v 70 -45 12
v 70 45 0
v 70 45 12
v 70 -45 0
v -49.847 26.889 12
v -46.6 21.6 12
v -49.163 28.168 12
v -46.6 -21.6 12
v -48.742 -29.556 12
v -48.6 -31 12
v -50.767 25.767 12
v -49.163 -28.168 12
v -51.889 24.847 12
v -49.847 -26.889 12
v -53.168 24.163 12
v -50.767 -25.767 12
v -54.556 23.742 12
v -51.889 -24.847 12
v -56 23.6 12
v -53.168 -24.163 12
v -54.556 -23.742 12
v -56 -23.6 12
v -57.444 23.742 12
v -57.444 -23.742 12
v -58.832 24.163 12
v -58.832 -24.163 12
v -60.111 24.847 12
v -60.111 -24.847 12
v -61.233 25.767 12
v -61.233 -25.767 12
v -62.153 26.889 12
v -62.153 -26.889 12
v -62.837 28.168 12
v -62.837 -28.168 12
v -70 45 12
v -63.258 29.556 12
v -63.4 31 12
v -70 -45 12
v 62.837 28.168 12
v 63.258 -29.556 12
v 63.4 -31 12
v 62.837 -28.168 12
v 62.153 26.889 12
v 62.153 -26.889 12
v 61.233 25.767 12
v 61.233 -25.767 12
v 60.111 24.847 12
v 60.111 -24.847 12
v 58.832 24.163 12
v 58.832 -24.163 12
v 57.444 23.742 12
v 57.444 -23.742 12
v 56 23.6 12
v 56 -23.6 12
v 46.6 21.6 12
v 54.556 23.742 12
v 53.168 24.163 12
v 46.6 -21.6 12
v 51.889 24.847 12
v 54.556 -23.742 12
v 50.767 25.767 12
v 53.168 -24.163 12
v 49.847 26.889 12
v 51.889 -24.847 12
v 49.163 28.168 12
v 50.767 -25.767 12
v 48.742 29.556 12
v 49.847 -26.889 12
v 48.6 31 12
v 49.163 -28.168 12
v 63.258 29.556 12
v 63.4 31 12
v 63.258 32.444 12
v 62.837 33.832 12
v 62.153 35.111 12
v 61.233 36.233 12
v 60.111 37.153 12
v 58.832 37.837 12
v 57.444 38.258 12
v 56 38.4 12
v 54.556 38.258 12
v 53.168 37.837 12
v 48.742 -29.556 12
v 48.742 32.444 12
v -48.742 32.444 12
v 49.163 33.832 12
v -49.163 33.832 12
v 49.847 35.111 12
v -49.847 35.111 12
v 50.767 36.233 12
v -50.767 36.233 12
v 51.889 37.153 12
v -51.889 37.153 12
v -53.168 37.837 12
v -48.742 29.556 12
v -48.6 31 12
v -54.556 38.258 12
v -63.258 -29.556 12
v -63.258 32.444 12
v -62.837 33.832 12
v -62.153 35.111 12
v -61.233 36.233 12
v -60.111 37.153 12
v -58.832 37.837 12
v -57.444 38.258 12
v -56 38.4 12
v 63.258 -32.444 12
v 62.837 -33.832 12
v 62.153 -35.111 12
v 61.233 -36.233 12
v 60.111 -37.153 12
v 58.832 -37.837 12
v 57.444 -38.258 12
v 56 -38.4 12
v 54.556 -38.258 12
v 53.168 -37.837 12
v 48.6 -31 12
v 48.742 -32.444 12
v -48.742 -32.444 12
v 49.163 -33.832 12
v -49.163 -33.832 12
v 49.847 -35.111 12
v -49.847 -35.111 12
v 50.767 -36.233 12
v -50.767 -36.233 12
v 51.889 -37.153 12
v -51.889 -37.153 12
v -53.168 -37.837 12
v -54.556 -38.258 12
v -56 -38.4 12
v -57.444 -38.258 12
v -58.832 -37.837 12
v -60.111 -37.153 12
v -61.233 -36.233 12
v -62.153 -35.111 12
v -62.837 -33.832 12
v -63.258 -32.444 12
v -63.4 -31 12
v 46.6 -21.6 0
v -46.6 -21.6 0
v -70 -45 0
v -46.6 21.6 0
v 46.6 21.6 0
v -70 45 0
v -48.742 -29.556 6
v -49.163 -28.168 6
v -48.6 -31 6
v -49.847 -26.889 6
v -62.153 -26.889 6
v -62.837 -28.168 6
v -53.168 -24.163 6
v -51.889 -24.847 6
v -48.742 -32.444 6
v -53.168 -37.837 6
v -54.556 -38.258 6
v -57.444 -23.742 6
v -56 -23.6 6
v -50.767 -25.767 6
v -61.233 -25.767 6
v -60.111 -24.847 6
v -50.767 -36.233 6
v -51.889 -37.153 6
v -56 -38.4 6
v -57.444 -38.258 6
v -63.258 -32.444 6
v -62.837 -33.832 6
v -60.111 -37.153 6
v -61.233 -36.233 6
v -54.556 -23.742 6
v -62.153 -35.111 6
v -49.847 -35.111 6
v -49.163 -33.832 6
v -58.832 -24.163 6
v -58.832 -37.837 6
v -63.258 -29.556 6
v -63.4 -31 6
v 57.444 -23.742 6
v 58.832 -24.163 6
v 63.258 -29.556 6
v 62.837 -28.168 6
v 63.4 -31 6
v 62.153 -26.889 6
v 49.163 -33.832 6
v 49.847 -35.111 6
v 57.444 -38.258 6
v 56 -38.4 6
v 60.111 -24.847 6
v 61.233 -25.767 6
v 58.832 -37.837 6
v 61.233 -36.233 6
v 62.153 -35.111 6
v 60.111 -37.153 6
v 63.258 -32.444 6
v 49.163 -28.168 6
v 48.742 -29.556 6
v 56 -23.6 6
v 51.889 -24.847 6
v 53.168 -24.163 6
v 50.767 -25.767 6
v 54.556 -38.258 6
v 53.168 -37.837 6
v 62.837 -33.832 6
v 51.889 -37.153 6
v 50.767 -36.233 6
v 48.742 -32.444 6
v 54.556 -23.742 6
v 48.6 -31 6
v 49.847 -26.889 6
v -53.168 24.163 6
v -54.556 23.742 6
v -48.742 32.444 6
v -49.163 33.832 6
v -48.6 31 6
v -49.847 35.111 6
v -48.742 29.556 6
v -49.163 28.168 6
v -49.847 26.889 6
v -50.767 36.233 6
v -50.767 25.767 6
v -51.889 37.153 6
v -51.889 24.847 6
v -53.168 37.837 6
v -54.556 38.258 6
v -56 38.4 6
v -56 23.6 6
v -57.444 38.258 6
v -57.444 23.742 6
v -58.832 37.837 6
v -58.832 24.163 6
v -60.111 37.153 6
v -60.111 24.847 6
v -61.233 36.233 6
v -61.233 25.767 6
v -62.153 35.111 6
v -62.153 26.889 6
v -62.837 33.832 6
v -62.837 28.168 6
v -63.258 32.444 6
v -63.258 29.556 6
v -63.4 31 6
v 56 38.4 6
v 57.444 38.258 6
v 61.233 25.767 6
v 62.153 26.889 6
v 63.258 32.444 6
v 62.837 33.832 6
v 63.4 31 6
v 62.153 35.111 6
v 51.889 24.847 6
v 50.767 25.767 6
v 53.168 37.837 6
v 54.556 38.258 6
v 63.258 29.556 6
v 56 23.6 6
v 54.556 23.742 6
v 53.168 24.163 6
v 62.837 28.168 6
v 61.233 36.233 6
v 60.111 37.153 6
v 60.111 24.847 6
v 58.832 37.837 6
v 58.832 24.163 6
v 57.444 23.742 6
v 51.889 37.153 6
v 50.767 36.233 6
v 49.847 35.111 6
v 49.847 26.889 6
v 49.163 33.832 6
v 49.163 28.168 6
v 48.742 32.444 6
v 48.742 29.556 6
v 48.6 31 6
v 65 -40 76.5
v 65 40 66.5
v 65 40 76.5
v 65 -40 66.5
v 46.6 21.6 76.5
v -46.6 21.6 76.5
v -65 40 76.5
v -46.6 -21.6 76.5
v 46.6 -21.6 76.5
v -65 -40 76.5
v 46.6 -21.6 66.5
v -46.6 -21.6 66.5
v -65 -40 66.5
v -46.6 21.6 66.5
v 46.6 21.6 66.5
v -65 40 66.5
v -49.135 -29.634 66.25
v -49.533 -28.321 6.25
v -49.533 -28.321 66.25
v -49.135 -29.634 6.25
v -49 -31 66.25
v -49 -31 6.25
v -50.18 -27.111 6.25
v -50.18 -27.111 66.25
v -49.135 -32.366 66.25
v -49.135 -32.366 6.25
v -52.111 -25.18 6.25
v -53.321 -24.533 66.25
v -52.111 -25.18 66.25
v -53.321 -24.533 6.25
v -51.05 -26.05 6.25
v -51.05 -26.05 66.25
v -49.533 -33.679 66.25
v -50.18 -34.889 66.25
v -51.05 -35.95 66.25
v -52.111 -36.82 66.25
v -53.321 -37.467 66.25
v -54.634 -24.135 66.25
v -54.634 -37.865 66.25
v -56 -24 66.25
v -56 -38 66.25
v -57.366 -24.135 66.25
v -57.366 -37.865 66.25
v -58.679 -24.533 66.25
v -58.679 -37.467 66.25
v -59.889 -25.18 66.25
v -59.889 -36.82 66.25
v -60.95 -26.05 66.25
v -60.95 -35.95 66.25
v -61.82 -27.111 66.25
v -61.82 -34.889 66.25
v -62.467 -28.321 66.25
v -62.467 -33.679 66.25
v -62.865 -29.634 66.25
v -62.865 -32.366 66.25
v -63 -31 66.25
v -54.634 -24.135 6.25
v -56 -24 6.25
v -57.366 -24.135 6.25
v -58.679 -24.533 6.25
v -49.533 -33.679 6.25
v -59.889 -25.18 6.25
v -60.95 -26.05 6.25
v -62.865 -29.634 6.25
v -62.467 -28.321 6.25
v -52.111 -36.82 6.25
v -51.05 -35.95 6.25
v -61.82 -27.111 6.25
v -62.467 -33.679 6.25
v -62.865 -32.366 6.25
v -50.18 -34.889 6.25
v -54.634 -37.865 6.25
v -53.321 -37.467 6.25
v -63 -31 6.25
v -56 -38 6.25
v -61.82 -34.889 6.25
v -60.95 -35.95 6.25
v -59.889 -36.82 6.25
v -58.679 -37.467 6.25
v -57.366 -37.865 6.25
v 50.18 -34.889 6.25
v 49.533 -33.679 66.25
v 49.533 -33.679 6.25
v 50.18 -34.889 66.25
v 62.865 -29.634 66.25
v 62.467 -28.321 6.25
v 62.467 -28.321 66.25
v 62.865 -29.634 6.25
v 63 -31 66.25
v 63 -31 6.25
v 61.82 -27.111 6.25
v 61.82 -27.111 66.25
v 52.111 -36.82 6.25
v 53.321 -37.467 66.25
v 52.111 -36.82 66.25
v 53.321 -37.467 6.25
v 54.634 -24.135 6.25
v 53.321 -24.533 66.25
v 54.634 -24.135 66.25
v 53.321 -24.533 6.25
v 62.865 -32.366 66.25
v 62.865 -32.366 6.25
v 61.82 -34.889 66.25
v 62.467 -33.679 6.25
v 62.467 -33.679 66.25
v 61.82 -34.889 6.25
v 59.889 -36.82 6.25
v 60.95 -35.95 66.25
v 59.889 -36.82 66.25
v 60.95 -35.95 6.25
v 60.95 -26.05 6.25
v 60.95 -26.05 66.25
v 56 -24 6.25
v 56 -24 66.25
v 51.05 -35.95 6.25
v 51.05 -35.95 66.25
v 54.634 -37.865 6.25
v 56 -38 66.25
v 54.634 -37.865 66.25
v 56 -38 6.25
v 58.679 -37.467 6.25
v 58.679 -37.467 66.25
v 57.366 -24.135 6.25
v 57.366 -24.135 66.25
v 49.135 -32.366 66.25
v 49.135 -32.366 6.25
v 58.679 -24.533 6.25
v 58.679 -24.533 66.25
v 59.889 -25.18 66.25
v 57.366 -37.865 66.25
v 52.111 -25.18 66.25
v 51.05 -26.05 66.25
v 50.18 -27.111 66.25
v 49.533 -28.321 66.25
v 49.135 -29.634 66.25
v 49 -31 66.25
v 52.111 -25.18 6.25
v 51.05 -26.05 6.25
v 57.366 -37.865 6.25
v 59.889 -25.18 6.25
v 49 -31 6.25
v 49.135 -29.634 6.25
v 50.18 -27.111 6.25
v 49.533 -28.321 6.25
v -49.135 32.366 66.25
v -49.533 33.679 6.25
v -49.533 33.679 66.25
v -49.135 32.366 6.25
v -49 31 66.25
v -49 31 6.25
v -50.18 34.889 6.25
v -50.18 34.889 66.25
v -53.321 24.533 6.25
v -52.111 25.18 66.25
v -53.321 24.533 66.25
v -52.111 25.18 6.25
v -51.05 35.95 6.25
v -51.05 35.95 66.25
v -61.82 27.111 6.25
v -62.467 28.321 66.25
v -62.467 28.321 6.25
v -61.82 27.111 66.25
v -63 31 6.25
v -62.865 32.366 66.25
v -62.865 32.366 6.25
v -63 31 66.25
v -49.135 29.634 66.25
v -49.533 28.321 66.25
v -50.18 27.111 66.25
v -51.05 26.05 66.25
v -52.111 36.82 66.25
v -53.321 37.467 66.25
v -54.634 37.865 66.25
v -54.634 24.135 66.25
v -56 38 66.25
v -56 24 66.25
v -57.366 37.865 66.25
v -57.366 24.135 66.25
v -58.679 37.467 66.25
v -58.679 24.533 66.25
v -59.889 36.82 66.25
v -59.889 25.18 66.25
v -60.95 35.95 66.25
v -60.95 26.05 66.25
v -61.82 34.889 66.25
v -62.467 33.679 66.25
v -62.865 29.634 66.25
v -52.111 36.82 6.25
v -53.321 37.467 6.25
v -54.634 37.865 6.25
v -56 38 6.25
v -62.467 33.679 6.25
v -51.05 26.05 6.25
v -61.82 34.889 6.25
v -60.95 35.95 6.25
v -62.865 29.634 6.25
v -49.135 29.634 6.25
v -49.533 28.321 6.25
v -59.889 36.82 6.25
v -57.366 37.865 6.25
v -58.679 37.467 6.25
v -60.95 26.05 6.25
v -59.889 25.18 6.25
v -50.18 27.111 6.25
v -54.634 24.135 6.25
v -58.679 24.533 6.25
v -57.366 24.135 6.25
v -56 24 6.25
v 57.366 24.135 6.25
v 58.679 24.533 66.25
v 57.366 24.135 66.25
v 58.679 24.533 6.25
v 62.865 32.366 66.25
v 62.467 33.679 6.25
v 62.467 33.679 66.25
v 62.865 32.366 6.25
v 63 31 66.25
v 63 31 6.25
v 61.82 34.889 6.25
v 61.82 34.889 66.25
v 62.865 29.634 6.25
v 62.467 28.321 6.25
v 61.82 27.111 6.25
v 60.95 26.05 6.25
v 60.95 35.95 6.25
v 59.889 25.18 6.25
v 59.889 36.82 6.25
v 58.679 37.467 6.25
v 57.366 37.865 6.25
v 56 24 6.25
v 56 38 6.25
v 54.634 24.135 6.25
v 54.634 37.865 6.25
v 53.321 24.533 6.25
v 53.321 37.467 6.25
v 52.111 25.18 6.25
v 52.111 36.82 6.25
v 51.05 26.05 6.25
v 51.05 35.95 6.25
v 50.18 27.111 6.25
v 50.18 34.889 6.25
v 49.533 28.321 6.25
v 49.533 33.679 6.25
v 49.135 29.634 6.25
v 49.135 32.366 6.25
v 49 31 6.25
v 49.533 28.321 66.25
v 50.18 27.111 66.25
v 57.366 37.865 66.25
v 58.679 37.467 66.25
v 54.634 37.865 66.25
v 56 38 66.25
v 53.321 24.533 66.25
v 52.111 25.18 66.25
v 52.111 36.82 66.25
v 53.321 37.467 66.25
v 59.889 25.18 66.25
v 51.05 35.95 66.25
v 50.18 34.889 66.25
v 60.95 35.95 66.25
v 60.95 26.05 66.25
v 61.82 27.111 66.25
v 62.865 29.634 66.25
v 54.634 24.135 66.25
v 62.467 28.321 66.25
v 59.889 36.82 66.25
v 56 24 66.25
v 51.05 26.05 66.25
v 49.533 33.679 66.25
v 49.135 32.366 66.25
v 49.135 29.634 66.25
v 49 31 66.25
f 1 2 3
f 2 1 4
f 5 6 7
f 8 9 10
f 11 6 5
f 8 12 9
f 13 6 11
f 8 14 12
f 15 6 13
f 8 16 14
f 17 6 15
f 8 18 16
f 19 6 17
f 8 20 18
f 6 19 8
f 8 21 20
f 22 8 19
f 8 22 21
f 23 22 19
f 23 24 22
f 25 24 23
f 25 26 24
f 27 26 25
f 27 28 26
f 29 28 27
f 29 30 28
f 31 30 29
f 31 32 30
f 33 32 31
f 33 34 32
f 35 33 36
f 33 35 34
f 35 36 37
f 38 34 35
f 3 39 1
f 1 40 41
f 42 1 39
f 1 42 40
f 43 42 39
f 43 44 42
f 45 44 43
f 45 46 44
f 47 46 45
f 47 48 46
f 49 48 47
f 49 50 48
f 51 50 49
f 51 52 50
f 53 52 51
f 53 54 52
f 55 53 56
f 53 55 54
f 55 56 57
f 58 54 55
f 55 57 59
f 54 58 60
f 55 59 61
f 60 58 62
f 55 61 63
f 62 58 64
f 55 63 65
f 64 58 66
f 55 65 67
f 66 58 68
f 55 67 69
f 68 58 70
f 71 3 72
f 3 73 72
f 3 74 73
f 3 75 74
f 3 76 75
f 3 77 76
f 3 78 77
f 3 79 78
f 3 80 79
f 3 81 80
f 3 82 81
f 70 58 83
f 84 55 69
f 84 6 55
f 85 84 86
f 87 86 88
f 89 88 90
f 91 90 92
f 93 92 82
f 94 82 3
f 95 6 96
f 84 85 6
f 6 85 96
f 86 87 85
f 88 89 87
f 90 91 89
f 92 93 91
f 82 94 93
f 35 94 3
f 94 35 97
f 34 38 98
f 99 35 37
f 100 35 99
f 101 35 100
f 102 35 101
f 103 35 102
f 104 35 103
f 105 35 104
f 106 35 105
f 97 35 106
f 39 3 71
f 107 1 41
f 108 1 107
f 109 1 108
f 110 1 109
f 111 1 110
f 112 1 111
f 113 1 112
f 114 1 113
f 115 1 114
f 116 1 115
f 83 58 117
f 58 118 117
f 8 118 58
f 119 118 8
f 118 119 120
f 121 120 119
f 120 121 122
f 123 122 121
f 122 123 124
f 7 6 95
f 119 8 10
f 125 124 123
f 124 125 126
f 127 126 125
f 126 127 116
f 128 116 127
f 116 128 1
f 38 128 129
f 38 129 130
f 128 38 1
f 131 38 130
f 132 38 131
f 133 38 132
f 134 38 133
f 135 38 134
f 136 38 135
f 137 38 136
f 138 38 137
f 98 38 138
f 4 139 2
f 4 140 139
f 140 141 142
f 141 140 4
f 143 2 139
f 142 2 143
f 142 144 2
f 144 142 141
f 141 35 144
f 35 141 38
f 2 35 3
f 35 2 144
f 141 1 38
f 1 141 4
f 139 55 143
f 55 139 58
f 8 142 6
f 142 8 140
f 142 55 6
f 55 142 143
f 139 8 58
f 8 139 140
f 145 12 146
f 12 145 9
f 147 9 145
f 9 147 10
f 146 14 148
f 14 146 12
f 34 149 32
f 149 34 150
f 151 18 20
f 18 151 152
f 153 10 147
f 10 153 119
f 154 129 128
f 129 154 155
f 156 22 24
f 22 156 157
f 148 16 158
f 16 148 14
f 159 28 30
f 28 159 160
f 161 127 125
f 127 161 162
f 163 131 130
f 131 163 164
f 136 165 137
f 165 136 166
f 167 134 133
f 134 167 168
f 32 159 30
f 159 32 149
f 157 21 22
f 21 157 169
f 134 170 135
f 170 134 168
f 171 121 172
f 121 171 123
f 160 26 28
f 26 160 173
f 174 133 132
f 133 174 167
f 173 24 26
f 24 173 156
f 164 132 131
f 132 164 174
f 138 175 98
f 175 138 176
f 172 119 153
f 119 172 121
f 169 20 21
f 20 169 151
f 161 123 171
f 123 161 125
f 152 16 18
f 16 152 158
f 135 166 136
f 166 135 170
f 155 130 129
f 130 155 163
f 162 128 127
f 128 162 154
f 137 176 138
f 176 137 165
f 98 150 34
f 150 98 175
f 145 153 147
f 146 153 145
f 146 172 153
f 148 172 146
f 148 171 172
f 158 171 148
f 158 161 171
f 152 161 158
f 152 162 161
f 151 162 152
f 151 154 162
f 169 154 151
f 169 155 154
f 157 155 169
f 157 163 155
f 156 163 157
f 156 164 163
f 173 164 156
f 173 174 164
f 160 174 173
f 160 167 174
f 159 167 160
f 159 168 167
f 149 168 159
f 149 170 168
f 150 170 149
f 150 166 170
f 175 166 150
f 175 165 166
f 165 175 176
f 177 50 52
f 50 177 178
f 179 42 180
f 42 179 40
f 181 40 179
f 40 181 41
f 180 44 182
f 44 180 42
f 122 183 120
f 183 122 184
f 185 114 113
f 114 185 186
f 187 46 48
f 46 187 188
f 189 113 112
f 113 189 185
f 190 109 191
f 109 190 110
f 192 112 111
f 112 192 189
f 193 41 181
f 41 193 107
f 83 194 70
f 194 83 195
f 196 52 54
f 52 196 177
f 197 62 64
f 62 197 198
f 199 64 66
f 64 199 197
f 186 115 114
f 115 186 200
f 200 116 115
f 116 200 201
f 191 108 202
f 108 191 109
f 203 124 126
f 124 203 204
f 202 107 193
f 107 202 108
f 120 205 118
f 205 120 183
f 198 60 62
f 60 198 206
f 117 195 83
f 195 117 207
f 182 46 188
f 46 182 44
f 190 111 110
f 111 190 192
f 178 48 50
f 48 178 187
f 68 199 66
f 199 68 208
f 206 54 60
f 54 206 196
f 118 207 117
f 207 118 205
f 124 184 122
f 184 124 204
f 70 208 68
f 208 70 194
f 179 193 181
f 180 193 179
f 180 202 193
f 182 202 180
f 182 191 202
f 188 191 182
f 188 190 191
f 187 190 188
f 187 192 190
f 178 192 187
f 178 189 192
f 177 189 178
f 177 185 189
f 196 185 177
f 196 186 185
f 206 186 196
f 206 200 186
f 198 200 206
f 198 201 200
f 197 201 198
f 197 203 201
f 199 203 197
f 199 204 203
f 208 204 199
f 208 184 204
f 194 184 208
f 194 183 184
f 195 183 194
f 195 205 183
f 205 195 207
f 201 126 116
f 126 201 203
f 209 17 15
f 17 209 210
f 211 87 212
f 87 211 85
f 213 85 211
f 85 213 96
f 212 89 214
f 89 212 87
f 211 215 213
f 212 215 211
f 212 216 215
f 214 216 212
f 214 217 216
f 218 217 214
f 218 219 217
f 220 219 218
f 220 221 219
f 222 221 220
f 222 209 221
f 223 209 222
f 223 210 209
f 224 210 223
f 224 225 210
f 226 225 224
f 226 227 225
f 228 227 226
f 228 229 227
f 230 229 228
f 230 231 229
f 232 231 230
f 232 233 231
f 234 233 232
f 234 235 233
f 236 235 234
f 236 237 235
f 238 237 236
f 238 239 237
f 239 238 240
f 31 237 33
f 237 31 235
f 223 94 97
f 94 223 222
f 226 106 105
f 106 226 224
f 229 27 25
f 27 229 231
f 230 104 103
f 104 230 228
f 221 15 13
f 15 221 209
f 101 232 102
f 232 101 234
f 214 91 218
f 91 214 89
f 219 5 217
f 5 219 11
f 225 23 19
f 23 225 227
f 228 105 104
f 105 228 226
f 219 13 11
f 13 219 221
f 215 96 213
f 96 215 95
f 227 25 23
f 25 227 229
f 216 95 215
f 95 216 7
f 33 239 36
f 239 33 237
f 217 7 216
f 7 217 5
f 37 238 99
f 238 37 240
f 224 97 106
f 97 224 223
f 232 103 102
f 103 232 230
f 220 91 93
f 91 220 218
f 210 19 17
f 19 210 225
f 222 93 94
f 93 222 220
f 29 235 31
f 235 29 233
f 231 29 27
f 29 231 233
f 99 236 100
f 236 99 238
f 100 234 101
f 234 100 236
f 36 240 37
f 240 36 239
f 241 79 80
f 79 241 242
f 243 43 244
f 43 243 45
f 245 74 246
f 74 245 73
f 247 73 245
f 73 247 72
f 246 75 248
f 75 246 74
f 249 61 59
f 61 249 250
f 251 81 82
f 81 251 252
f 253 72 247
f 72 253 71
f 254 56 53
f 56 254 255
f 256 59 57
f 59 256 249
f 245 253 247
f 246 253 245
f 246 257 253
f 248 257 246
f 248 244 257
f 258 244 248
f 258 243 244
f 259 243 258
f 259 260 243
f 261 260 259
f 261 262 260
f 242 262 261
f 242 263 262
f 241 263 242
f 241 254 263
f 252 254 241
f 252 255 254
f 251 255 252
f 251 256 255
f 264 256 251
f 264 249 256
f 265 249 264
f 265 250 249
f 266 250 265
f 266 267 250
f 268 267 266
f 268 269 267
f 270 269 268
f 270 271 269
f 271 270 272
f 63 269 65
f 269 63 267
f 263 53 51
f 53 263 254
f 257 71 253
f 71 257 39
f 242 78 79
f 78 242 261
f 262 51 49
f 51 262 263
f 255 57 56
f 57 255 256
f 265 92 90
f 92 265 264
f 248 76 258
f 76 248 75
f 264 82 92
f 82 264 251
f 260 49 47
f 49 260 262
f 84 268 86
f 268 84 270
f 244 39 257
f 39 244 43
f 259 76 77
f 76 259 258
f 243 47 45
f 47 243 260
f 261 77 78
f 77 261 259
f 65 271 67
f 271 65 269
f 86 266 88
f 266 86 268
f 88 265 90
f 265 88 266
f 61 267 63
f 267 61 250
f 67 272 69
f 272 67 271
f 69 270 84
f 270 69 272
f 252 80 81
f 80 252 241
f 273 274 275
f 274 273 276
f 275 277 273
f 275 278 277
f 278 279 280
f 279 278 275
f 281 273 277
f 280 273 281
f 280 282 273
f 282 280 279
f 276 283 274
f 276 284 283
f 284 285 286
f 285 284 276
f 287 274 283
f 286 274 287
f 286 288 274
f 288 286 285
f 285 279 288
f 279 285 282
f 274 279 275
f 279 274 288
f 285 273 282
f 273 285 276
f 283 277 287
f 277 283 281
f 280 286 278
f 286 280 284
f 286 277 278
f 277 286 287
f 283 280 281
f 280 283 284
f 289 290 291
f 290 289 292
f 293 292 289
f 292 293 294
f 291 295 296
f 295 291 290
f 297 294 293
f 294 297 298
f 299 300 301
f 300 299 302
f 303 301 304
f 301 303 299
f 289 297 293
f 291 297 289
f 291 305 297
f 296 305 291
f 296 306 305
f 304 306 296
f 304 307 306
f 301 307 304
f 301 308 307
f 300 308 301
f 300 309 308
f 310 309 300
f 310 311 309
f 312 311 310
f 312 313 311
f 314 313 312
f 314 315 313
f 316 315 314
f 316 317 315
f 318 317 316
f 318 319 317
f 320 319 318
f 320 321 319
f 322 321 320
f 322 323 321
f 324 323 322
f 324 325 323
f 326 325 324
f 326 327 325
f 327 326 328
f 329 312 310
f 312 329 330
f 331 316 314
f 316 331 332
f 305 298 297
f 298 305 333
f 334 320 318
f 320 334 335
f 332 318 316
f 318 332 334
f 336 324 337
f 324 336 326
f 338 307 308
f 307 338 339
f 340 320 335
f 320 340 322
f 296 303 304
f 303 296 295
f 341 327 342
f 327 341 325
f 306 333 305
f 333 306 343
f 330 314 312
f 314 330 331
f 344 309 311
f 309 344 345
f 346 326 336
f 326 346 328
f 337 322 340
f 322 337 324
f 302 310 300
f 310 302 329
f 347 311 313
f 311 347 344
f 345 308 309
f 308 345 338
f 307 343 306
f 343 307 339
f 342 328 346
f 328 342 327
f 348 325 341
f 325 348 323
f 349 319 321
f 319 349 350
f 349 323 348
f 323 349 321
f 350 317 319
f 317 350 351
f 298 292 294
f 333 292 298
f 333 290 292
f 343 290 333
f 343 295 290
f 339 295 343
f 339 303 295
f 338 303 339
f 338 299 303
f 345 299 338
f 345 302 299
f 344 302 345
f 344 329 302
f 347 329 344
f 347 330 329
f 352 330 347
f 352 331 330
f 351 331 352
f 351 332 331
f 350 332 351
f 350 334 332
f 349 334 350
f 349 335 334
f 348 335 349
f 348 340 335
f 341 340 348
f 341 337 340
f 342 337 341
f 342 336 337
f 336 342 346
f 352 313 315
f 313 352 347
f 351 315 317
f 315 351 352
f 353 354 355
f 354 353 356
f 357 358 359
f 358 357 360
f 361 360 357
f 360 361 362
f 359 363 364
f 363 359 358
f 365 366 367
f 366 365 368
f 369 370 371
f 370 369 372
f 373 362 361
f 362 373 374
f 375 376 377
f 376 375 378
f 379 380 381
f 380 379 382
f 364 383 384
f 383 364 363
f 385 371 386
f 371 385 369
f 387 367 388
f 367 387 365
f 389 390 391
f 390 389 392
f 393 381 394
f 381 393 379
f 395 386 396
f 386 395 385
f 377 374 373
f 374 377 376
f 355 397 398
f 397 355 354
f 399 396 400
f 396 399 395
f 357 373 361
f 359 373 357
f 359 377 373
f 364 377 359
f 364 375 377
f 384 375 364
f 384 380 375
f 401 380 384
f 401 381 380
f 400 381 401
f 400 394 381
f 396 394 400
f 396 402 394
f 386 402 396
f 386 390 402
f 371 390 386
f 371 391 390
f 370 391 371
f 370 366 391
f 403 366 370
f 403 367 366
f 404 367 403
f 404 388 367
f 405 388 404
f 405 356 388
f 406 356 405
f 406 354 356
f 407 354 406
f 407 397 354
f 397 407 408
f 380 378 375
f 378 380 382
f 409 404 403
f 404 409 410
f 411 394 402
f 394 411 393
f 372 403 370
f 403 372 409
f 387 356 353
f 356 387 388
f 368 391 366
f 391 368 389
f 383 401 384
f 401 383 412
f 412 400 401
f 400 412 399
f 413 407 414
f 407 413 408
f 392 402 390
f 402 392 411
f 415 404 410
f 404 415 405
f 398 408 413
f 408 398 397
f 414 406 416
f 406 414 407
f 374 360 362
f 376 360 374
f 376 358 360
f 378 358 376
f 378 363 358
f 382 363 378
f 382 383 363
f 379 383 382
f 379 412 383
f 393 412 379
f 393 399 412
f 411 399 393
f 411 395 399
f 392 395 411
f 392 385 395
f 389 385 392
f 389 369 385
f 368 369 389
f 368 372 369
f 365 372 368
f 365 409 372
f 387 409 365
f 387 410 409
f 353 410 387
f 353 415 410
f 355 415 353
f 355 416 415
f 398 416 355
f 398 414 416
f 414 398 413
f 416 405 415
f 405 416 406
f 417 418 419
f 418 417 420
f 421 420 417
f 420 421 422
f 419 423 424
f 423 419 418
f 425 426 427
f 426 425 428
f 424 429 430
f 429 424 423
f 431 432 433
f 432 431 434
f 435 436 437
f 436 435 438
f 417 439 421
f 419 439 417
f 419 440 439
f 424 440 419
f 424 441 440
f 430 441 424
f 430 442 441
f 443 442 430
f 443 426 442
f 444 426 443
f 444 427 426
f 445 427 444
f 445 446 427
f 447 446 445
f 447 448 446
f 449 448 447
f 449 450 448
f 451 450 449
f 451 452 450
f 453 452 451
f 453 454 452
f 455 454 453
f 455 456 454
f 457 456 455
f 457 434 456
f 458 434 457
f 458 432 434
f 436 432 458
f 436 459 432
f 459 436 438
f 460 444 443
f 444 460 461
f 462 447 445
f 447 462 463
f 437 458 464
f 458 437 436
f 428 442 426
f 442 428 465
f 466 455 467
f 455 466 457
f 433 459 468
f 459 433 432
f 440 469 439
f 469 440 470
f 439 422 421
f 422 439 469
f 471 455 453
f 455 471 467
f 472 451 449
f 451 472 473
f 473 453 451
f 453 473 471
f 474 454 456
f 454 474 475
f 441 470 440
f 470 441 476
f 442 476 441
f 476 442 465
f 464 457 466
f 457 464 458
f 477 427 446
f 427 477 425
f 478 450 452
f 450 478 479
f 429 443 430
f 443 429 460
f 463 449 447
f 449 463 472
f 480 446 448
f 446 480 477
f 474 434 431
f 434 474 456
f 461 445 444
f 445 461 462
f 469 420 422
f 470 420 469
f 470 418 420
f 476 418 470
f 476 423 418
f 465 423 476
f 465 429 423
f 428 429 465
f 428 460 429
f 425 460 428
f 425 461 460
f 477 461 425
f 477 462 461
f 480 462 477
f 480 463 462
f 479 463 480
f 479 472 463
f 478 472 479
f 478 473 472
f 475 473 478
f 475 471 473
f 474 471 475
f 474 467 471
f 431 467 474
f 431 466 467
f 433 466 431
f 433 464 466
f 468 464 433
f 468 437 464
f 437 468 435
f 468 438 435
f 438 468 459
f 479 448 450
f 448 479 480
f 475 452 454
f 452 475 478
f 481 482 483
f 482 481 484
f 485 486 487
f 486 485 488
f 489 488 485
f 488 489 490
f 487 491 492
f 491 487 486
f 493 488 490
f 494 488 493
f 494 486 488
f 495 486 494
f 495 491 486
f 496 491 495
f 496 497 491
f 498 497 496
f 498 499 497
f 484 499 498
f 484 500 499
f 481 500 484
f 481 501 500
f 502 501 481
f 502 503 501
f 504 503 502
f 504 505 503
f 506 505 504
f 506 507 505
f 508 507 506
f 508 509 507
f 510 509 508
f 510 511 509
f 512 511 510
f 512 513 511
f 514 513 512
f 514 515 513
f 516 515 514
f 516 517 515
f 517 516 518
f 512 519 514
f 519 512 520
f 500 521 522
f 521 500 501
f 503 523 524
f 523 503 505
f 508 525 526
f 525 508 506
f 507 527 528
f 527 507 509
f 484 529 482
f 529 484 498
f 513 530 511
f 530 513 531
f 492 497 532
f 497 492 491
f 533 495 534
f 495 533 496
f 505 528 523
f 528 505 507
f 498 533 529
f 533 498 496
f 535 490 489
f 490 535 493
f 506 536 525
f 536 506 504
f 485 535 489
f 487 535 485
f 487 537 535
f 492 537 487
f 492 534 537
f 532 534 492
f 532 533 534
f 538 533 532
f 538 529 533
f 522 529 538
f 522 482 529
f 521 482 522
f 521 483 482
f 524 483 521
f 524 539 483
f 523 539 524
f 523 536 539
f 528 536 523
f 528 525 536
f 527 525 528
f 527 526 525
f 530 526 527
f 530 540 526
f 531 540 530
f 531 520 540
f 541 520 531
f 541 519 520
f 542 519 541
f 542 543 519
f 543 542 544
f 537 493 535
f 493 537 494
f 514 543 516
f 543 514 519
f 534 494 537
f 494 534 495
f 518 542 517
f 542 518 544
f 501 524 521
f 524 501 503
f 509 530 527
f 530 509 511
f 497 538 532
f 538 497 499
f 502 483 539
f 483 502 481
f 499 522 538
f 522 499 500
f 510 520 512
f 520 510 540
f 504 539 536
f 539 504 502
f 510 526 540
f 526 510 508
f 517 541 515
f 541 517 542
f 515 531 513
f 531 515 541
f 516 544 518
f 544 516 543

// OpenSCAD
$fn = 32;

// ------------------------------------------------------------------------
// Frame cube: base 140 x 90 mm, posts 60 mm tall
// Every part is its own module, assembly() places every instance.
// ------------------------------------------------------------------------

// --- part 1 ---
module base_frame() {
  difference() {
    translate([-70, -45, 0]) cube([140, 90, 12]);
    translate([-46.6, -21.6, -1]) cube([93.2, 43.2, 14]);
    translate([-56, -31, 6]) cylinder(h = 7, d = 14.8);
    translate([56, -31, 6]) cylinder(h = 7, d = 14.8);
    translate([-56, 31, 6]) cylinder(h = 7, d = 14.8);
    translate([56, 31, 6]) cylinder(h = 7, d = 14.8);
  }
}

// --- part 2 ---
module corner_post() {
  cylinder(h = 60, d = 14);
}

// --- part 3 ---
module top_frame() {
  difference() {
    translate([-65, -40, 0]) cube([130, 80, 10]);
    translate([-46.6, -21.6, -1]) cube([93.2, 43.2, 12]);
  }
}

// --- assembly ---
module assembly() {
  color([0.80, 0.24, 0.20]) translate([0, 0, 0]) rotate([0, 0, 0]) base_frame();
  color([0.20, 0.45, 0.75]) translate([-56, -31, 6.25]) rotate([0, 0, 0]) corner_post();
  color([0.25, 0.62, 0.32]) translate([56, -31, 6.25]) rotate([0, 0, 0]) corner_post();
  color([0.92, 0.70, 0.18]) translate([-56, 31, 6.25]) rotate([0, 0, 0]) corner_post();
  color([0.58, 0.35, 0.70]) translate([56, 31, 6.25]) rotate([0, 0, 0]) corner_post();
  color([0.16, 0.66, 0.66]) translate([0, 0, 66.5]) rotate([0, 0, 0]) top_frame();
}

assembly();
